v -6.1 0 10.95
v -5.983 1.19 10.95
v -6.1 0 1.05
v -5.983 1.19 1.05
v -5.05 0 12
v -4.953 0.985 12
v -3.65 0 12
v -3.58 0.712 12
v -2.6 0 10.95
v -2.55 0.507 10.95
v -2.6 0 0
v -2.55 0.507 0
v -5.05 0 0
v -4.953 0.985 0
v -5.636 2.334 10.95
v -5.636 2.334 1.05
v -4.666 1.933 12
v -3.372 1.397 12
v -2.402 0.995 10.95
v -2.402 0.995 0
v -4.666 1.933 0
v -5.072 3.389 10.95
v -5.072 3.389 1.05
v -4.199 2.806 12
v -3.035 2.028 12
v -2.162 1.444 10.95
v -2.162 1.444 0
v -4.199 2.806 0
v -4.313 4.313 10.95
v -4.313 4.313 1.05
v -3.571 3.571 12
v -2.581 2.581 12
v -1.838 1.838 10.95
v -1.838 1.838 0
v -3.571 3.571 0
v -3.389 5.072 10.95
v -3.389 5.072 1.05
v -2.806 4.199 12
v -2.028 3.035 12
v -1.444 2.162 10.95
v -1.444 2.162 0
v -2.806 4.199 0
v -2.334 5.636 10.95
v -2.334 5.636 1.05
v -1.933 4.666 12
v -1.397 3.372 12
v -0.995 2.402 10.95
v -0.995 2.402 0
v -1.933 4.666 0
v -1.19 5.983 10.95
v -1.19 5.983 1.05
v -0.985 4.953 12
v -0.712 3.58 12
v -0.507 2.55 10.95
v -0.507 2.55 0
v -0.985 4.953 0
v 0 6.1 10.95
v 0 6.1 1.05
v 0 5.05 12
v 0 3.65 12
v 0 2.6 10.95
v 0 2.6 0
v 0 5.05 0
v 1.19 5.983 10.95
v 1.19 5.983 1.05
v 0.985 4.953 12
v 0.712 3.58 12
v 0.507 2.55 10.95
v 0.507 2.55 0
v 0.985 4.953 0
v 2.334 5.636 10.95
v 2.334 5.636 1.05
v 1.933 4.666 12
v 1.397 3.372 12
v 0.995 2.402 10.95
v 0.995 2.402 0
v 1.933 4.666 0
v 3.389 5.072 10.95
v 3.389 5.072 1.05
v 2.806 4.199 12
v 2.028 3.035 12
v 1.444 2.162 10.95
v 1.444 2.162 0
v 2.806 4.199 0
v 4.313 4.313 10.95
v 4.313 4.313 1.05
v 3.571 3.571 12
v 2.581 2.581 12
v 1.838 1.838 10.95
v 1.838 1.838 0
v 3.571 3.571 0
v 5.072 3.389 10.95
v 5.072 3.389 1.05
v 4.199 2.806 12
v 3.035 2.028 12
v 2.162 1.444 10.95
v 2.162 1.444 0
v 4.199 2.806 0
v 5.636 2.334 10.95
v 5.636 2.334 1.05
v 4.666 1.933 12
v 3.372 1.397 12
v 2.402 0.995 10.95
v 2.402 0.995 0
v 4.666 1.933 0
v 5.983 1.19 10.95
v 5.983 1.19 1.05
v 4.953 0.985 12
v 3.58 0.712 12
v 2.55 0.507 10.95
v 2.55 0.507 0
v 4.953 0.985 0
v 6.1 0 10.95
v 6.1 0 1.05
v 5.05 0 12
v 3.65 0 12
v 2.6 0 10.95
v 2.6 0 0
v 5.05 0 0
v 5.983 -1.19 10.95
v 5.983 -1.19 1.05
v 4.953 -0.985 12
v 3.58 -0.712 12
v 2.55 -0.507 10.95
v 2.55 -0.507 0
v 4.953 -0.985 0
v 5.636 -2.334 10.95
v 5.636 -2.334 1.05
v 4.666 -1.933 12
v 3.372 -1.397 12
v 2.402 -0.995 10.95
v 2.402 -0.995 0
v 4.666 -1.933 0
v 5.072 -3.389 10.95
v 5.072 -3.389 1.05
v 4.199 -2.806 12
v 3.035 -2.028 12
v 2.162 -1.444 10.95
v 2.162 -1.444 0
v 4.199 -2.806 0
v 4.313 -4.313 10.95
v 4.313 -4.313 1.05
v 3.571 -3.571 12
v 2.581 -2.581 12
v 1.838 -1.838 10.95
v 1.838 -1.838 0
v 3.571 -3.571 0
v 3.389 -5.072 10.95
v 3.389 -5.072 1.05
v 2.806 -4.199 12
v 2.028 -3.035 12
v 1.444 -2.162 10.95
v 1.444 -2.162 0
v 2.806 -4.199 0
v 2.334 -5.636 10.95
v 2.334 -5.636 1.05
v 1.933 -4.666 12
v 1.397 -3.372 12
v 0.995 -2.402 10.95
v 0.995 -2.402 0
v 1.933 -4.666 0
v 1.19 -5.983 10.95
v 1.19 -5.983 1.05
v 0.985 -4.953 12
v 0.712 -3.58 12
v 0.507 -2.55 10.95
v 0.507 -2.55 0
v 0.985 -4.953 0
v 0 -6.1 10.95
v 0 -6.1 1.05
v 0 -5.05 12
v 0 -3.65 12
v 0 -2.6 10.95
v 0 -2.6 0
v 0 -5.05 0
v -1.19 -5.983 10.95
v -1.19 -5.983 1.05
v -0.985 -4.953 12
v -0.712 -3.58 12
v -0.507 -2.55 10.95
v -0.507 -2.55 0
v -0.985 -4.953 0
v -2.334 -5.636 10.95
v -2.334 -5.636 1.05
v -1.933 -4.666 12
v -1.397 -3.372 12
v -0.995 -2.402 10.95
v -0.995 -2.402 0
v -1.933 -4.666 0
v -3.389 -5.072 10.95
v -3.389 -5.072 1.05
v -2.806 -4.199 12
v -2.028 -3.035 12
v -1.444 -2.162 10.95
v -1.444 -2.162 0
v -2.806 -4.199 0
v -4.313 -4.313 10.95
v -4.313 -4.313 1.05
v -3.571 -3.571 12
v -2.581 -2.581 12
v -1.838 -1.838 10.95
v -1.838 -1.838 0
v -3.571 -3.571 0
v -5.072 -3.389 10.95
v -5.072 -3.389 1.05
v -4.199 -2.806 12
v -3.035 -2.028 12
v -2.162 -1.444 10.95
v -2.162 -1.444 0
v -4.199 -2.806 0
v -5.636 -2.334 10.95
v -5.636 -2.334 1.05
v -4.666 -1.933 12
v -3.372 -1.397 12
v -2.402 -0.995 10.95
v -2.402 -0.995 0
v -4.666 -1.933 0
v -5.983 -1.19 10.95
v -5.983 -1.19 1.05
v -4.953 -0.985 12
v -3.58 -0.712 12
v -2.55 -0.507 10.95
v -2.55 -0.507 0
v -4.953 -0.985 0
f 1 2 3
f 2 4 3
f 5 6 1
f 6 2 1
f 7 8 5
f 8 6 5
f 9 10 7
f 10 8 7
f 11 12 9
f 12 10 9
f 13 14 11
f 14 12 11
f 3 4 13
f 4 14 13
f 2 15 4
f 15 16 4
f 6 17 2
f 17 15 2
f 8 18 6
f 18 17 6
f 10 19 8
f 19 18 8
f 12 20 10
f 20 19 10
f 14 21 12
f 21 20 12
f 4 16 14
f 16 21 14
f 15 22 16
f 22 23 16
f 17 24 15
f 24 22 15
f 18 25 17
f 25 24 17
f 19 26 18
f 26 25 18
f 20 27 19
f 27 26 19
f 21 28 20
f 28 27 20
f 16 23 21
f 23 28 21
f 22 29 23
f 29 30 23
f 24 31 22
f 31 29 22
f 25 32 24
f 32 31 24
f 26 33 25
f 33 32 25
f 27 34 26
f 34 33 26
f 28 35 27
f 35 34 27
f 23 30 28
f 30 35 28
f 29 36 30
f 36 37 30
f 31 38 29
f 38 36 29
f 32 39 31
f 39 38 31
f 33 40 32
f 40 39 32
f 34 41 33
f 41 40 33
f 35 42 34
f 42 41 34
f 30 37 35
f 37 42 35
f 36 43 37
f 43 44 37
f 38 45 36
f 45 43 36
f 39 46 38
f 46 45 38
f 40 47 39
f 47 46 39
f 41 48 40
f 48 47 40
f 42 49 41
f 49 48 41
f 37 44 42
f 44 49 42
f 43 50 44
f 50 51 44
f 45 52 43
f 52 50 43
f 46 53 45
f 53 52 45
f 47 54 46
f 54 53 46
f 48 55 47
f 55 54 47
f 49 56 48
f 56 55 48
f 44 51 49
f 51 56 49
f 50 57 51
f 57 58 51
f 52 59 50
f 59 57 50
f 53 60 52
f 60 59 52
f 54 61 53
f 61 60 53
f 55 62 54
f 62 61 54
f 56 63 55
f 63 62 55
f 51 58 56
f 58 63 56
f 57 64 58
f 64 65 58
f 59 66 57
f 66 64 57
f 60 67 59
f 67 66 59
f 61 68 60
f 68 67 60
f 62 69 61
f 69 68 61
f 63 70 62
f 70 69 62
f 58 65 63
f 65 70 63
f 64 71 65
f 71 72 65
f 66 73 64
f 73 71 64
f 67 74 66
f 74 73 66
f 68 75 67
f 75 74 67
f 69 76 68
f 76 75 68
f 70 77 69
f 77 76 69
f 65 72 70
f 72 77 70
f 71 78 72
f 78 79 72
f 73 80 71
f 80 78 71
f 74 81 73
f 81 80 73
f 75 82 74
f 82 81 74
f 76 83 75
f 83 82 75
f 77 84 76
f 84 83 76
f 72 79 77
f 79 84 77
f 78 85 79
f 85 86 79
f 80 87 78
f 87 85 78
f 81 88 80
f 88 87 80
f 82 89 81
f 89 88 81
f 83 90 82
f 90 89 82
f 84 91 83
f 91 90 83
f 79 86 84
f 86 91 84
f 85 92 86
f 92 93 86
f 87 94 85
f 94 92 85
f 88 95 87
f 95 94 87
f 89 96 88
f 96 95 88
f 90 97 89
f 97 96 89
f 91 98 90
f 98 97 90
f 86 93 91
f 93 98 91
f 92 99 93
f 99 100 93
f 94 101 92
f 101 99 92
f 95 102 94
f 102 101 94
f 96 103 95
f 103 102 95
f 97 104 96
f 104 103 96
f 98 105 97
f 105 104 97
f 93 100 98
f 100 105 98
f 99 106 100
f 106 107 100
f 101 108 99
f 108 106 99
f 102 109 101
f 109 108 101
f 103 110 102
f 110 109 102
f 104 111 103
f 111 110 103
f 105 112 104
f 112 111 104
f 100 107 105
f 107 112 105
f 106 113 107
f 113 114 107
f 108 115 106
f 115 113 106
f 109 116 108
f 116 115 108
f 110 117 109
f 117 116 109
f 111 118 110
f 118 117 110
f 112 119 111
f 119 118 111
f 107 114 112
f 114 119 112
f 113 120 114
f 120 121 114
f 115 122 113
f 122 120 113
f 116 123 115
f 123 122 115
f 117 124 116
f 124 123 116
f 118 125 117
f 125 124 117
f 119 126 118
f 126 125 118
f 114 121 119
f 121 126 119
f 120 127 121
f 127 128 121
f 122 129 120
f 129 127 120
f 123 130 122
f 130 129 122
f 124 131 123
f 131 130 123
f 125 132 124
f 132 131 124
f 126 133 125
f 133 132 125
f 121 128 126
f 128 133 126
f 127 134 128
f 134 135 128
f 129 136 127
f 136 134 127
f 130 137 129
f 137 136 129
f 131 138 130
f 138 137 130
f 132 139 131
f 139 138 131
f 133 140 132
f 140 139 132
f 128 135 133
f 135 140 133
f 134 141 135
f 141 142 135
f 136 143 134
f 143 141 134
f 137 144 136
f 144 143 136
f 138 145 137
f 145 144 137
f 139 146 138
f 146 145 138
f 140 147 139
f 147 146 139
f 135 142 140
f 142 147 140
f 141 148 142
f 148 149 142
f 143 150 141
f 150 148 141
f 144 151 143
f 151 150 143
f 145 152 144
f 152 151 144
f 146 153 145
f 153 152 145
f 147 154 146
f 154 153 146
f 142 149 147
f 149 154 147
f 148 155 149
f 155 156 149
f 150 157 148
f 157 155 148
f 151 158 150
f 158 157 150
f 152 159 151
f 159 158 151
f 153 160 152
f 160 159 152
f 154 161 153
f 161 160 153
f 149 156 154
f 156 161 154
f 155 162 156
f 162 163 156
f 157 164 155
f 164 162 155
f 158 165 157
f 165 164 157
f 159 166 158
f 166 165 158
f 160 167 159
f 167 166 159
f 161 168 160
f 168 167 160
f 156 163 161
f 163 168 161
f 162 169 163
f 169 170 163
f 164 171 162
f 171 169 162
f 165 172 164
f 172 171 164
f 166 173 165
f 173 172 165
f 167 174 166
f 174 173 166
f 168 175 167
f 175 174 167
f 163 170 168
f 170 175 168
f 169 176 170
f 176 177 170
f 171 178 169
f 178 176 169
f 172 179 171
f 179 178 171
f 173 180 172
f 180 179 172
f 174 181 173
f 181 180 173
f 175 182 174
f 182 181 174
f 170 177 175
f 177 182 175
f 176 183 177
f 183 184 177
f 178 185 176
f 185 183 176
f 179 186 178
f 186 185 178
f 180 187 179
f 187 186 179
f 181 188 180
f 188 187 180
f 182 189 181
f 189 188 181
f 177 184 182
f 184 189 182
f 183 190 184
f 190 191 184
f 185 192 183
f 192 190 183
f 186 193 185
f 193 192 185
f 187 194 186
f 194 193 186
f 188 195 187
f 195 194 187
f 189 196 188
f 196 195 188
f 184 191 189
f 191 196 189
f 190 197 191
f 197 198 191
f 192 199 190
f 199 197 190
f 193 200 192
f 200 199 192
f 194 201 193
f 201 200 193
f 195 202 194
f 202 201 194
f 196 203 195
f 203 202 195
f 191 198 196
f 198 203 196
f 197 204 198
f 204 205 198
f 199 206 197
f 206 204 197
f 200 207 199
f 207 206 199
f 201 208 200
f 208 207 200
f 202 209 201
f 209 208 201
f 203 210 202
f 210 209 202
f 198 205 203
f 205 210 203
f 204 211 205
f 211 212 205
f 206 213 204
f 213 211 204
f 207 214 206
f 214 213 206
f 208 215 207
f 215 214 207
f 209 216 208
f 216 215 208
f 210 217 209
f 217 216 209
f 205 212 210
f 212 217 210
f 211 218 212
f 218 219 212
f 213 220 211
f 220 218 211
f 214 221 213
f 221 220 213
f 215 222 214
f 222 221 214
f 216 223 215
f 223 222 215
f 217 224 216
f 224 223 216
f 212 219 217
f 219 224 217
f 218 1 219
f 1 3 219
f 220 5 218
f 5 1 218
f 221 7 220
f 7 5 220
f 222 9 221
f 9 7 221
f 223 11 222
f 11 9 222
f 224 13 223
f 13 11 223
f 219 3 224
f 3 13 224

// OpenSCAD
$fn = 32;

// ----------------------------------------------------------------------
// Form washer: chamfered washer, 12.2 mm outside, 5.2 mm bore
// ----------------------------------------------------------------------

// --- parameters (mm) ---
revolve_angle = 360;      // full turn around the Z axis
profile_points = 7;       // points of the closed outline

profile = [[2.6, 0], [5.05, 0], [6.1, 1.05], [6.1, 10.95], [5.05, 12], [3.65, 12], [2.6, 10.95]];  // single closed polygon, 7 points, counter clockwise

// --- the one profile operation ---
rotate_extrude(angle = revolve_angle) polygon(points = profile);
